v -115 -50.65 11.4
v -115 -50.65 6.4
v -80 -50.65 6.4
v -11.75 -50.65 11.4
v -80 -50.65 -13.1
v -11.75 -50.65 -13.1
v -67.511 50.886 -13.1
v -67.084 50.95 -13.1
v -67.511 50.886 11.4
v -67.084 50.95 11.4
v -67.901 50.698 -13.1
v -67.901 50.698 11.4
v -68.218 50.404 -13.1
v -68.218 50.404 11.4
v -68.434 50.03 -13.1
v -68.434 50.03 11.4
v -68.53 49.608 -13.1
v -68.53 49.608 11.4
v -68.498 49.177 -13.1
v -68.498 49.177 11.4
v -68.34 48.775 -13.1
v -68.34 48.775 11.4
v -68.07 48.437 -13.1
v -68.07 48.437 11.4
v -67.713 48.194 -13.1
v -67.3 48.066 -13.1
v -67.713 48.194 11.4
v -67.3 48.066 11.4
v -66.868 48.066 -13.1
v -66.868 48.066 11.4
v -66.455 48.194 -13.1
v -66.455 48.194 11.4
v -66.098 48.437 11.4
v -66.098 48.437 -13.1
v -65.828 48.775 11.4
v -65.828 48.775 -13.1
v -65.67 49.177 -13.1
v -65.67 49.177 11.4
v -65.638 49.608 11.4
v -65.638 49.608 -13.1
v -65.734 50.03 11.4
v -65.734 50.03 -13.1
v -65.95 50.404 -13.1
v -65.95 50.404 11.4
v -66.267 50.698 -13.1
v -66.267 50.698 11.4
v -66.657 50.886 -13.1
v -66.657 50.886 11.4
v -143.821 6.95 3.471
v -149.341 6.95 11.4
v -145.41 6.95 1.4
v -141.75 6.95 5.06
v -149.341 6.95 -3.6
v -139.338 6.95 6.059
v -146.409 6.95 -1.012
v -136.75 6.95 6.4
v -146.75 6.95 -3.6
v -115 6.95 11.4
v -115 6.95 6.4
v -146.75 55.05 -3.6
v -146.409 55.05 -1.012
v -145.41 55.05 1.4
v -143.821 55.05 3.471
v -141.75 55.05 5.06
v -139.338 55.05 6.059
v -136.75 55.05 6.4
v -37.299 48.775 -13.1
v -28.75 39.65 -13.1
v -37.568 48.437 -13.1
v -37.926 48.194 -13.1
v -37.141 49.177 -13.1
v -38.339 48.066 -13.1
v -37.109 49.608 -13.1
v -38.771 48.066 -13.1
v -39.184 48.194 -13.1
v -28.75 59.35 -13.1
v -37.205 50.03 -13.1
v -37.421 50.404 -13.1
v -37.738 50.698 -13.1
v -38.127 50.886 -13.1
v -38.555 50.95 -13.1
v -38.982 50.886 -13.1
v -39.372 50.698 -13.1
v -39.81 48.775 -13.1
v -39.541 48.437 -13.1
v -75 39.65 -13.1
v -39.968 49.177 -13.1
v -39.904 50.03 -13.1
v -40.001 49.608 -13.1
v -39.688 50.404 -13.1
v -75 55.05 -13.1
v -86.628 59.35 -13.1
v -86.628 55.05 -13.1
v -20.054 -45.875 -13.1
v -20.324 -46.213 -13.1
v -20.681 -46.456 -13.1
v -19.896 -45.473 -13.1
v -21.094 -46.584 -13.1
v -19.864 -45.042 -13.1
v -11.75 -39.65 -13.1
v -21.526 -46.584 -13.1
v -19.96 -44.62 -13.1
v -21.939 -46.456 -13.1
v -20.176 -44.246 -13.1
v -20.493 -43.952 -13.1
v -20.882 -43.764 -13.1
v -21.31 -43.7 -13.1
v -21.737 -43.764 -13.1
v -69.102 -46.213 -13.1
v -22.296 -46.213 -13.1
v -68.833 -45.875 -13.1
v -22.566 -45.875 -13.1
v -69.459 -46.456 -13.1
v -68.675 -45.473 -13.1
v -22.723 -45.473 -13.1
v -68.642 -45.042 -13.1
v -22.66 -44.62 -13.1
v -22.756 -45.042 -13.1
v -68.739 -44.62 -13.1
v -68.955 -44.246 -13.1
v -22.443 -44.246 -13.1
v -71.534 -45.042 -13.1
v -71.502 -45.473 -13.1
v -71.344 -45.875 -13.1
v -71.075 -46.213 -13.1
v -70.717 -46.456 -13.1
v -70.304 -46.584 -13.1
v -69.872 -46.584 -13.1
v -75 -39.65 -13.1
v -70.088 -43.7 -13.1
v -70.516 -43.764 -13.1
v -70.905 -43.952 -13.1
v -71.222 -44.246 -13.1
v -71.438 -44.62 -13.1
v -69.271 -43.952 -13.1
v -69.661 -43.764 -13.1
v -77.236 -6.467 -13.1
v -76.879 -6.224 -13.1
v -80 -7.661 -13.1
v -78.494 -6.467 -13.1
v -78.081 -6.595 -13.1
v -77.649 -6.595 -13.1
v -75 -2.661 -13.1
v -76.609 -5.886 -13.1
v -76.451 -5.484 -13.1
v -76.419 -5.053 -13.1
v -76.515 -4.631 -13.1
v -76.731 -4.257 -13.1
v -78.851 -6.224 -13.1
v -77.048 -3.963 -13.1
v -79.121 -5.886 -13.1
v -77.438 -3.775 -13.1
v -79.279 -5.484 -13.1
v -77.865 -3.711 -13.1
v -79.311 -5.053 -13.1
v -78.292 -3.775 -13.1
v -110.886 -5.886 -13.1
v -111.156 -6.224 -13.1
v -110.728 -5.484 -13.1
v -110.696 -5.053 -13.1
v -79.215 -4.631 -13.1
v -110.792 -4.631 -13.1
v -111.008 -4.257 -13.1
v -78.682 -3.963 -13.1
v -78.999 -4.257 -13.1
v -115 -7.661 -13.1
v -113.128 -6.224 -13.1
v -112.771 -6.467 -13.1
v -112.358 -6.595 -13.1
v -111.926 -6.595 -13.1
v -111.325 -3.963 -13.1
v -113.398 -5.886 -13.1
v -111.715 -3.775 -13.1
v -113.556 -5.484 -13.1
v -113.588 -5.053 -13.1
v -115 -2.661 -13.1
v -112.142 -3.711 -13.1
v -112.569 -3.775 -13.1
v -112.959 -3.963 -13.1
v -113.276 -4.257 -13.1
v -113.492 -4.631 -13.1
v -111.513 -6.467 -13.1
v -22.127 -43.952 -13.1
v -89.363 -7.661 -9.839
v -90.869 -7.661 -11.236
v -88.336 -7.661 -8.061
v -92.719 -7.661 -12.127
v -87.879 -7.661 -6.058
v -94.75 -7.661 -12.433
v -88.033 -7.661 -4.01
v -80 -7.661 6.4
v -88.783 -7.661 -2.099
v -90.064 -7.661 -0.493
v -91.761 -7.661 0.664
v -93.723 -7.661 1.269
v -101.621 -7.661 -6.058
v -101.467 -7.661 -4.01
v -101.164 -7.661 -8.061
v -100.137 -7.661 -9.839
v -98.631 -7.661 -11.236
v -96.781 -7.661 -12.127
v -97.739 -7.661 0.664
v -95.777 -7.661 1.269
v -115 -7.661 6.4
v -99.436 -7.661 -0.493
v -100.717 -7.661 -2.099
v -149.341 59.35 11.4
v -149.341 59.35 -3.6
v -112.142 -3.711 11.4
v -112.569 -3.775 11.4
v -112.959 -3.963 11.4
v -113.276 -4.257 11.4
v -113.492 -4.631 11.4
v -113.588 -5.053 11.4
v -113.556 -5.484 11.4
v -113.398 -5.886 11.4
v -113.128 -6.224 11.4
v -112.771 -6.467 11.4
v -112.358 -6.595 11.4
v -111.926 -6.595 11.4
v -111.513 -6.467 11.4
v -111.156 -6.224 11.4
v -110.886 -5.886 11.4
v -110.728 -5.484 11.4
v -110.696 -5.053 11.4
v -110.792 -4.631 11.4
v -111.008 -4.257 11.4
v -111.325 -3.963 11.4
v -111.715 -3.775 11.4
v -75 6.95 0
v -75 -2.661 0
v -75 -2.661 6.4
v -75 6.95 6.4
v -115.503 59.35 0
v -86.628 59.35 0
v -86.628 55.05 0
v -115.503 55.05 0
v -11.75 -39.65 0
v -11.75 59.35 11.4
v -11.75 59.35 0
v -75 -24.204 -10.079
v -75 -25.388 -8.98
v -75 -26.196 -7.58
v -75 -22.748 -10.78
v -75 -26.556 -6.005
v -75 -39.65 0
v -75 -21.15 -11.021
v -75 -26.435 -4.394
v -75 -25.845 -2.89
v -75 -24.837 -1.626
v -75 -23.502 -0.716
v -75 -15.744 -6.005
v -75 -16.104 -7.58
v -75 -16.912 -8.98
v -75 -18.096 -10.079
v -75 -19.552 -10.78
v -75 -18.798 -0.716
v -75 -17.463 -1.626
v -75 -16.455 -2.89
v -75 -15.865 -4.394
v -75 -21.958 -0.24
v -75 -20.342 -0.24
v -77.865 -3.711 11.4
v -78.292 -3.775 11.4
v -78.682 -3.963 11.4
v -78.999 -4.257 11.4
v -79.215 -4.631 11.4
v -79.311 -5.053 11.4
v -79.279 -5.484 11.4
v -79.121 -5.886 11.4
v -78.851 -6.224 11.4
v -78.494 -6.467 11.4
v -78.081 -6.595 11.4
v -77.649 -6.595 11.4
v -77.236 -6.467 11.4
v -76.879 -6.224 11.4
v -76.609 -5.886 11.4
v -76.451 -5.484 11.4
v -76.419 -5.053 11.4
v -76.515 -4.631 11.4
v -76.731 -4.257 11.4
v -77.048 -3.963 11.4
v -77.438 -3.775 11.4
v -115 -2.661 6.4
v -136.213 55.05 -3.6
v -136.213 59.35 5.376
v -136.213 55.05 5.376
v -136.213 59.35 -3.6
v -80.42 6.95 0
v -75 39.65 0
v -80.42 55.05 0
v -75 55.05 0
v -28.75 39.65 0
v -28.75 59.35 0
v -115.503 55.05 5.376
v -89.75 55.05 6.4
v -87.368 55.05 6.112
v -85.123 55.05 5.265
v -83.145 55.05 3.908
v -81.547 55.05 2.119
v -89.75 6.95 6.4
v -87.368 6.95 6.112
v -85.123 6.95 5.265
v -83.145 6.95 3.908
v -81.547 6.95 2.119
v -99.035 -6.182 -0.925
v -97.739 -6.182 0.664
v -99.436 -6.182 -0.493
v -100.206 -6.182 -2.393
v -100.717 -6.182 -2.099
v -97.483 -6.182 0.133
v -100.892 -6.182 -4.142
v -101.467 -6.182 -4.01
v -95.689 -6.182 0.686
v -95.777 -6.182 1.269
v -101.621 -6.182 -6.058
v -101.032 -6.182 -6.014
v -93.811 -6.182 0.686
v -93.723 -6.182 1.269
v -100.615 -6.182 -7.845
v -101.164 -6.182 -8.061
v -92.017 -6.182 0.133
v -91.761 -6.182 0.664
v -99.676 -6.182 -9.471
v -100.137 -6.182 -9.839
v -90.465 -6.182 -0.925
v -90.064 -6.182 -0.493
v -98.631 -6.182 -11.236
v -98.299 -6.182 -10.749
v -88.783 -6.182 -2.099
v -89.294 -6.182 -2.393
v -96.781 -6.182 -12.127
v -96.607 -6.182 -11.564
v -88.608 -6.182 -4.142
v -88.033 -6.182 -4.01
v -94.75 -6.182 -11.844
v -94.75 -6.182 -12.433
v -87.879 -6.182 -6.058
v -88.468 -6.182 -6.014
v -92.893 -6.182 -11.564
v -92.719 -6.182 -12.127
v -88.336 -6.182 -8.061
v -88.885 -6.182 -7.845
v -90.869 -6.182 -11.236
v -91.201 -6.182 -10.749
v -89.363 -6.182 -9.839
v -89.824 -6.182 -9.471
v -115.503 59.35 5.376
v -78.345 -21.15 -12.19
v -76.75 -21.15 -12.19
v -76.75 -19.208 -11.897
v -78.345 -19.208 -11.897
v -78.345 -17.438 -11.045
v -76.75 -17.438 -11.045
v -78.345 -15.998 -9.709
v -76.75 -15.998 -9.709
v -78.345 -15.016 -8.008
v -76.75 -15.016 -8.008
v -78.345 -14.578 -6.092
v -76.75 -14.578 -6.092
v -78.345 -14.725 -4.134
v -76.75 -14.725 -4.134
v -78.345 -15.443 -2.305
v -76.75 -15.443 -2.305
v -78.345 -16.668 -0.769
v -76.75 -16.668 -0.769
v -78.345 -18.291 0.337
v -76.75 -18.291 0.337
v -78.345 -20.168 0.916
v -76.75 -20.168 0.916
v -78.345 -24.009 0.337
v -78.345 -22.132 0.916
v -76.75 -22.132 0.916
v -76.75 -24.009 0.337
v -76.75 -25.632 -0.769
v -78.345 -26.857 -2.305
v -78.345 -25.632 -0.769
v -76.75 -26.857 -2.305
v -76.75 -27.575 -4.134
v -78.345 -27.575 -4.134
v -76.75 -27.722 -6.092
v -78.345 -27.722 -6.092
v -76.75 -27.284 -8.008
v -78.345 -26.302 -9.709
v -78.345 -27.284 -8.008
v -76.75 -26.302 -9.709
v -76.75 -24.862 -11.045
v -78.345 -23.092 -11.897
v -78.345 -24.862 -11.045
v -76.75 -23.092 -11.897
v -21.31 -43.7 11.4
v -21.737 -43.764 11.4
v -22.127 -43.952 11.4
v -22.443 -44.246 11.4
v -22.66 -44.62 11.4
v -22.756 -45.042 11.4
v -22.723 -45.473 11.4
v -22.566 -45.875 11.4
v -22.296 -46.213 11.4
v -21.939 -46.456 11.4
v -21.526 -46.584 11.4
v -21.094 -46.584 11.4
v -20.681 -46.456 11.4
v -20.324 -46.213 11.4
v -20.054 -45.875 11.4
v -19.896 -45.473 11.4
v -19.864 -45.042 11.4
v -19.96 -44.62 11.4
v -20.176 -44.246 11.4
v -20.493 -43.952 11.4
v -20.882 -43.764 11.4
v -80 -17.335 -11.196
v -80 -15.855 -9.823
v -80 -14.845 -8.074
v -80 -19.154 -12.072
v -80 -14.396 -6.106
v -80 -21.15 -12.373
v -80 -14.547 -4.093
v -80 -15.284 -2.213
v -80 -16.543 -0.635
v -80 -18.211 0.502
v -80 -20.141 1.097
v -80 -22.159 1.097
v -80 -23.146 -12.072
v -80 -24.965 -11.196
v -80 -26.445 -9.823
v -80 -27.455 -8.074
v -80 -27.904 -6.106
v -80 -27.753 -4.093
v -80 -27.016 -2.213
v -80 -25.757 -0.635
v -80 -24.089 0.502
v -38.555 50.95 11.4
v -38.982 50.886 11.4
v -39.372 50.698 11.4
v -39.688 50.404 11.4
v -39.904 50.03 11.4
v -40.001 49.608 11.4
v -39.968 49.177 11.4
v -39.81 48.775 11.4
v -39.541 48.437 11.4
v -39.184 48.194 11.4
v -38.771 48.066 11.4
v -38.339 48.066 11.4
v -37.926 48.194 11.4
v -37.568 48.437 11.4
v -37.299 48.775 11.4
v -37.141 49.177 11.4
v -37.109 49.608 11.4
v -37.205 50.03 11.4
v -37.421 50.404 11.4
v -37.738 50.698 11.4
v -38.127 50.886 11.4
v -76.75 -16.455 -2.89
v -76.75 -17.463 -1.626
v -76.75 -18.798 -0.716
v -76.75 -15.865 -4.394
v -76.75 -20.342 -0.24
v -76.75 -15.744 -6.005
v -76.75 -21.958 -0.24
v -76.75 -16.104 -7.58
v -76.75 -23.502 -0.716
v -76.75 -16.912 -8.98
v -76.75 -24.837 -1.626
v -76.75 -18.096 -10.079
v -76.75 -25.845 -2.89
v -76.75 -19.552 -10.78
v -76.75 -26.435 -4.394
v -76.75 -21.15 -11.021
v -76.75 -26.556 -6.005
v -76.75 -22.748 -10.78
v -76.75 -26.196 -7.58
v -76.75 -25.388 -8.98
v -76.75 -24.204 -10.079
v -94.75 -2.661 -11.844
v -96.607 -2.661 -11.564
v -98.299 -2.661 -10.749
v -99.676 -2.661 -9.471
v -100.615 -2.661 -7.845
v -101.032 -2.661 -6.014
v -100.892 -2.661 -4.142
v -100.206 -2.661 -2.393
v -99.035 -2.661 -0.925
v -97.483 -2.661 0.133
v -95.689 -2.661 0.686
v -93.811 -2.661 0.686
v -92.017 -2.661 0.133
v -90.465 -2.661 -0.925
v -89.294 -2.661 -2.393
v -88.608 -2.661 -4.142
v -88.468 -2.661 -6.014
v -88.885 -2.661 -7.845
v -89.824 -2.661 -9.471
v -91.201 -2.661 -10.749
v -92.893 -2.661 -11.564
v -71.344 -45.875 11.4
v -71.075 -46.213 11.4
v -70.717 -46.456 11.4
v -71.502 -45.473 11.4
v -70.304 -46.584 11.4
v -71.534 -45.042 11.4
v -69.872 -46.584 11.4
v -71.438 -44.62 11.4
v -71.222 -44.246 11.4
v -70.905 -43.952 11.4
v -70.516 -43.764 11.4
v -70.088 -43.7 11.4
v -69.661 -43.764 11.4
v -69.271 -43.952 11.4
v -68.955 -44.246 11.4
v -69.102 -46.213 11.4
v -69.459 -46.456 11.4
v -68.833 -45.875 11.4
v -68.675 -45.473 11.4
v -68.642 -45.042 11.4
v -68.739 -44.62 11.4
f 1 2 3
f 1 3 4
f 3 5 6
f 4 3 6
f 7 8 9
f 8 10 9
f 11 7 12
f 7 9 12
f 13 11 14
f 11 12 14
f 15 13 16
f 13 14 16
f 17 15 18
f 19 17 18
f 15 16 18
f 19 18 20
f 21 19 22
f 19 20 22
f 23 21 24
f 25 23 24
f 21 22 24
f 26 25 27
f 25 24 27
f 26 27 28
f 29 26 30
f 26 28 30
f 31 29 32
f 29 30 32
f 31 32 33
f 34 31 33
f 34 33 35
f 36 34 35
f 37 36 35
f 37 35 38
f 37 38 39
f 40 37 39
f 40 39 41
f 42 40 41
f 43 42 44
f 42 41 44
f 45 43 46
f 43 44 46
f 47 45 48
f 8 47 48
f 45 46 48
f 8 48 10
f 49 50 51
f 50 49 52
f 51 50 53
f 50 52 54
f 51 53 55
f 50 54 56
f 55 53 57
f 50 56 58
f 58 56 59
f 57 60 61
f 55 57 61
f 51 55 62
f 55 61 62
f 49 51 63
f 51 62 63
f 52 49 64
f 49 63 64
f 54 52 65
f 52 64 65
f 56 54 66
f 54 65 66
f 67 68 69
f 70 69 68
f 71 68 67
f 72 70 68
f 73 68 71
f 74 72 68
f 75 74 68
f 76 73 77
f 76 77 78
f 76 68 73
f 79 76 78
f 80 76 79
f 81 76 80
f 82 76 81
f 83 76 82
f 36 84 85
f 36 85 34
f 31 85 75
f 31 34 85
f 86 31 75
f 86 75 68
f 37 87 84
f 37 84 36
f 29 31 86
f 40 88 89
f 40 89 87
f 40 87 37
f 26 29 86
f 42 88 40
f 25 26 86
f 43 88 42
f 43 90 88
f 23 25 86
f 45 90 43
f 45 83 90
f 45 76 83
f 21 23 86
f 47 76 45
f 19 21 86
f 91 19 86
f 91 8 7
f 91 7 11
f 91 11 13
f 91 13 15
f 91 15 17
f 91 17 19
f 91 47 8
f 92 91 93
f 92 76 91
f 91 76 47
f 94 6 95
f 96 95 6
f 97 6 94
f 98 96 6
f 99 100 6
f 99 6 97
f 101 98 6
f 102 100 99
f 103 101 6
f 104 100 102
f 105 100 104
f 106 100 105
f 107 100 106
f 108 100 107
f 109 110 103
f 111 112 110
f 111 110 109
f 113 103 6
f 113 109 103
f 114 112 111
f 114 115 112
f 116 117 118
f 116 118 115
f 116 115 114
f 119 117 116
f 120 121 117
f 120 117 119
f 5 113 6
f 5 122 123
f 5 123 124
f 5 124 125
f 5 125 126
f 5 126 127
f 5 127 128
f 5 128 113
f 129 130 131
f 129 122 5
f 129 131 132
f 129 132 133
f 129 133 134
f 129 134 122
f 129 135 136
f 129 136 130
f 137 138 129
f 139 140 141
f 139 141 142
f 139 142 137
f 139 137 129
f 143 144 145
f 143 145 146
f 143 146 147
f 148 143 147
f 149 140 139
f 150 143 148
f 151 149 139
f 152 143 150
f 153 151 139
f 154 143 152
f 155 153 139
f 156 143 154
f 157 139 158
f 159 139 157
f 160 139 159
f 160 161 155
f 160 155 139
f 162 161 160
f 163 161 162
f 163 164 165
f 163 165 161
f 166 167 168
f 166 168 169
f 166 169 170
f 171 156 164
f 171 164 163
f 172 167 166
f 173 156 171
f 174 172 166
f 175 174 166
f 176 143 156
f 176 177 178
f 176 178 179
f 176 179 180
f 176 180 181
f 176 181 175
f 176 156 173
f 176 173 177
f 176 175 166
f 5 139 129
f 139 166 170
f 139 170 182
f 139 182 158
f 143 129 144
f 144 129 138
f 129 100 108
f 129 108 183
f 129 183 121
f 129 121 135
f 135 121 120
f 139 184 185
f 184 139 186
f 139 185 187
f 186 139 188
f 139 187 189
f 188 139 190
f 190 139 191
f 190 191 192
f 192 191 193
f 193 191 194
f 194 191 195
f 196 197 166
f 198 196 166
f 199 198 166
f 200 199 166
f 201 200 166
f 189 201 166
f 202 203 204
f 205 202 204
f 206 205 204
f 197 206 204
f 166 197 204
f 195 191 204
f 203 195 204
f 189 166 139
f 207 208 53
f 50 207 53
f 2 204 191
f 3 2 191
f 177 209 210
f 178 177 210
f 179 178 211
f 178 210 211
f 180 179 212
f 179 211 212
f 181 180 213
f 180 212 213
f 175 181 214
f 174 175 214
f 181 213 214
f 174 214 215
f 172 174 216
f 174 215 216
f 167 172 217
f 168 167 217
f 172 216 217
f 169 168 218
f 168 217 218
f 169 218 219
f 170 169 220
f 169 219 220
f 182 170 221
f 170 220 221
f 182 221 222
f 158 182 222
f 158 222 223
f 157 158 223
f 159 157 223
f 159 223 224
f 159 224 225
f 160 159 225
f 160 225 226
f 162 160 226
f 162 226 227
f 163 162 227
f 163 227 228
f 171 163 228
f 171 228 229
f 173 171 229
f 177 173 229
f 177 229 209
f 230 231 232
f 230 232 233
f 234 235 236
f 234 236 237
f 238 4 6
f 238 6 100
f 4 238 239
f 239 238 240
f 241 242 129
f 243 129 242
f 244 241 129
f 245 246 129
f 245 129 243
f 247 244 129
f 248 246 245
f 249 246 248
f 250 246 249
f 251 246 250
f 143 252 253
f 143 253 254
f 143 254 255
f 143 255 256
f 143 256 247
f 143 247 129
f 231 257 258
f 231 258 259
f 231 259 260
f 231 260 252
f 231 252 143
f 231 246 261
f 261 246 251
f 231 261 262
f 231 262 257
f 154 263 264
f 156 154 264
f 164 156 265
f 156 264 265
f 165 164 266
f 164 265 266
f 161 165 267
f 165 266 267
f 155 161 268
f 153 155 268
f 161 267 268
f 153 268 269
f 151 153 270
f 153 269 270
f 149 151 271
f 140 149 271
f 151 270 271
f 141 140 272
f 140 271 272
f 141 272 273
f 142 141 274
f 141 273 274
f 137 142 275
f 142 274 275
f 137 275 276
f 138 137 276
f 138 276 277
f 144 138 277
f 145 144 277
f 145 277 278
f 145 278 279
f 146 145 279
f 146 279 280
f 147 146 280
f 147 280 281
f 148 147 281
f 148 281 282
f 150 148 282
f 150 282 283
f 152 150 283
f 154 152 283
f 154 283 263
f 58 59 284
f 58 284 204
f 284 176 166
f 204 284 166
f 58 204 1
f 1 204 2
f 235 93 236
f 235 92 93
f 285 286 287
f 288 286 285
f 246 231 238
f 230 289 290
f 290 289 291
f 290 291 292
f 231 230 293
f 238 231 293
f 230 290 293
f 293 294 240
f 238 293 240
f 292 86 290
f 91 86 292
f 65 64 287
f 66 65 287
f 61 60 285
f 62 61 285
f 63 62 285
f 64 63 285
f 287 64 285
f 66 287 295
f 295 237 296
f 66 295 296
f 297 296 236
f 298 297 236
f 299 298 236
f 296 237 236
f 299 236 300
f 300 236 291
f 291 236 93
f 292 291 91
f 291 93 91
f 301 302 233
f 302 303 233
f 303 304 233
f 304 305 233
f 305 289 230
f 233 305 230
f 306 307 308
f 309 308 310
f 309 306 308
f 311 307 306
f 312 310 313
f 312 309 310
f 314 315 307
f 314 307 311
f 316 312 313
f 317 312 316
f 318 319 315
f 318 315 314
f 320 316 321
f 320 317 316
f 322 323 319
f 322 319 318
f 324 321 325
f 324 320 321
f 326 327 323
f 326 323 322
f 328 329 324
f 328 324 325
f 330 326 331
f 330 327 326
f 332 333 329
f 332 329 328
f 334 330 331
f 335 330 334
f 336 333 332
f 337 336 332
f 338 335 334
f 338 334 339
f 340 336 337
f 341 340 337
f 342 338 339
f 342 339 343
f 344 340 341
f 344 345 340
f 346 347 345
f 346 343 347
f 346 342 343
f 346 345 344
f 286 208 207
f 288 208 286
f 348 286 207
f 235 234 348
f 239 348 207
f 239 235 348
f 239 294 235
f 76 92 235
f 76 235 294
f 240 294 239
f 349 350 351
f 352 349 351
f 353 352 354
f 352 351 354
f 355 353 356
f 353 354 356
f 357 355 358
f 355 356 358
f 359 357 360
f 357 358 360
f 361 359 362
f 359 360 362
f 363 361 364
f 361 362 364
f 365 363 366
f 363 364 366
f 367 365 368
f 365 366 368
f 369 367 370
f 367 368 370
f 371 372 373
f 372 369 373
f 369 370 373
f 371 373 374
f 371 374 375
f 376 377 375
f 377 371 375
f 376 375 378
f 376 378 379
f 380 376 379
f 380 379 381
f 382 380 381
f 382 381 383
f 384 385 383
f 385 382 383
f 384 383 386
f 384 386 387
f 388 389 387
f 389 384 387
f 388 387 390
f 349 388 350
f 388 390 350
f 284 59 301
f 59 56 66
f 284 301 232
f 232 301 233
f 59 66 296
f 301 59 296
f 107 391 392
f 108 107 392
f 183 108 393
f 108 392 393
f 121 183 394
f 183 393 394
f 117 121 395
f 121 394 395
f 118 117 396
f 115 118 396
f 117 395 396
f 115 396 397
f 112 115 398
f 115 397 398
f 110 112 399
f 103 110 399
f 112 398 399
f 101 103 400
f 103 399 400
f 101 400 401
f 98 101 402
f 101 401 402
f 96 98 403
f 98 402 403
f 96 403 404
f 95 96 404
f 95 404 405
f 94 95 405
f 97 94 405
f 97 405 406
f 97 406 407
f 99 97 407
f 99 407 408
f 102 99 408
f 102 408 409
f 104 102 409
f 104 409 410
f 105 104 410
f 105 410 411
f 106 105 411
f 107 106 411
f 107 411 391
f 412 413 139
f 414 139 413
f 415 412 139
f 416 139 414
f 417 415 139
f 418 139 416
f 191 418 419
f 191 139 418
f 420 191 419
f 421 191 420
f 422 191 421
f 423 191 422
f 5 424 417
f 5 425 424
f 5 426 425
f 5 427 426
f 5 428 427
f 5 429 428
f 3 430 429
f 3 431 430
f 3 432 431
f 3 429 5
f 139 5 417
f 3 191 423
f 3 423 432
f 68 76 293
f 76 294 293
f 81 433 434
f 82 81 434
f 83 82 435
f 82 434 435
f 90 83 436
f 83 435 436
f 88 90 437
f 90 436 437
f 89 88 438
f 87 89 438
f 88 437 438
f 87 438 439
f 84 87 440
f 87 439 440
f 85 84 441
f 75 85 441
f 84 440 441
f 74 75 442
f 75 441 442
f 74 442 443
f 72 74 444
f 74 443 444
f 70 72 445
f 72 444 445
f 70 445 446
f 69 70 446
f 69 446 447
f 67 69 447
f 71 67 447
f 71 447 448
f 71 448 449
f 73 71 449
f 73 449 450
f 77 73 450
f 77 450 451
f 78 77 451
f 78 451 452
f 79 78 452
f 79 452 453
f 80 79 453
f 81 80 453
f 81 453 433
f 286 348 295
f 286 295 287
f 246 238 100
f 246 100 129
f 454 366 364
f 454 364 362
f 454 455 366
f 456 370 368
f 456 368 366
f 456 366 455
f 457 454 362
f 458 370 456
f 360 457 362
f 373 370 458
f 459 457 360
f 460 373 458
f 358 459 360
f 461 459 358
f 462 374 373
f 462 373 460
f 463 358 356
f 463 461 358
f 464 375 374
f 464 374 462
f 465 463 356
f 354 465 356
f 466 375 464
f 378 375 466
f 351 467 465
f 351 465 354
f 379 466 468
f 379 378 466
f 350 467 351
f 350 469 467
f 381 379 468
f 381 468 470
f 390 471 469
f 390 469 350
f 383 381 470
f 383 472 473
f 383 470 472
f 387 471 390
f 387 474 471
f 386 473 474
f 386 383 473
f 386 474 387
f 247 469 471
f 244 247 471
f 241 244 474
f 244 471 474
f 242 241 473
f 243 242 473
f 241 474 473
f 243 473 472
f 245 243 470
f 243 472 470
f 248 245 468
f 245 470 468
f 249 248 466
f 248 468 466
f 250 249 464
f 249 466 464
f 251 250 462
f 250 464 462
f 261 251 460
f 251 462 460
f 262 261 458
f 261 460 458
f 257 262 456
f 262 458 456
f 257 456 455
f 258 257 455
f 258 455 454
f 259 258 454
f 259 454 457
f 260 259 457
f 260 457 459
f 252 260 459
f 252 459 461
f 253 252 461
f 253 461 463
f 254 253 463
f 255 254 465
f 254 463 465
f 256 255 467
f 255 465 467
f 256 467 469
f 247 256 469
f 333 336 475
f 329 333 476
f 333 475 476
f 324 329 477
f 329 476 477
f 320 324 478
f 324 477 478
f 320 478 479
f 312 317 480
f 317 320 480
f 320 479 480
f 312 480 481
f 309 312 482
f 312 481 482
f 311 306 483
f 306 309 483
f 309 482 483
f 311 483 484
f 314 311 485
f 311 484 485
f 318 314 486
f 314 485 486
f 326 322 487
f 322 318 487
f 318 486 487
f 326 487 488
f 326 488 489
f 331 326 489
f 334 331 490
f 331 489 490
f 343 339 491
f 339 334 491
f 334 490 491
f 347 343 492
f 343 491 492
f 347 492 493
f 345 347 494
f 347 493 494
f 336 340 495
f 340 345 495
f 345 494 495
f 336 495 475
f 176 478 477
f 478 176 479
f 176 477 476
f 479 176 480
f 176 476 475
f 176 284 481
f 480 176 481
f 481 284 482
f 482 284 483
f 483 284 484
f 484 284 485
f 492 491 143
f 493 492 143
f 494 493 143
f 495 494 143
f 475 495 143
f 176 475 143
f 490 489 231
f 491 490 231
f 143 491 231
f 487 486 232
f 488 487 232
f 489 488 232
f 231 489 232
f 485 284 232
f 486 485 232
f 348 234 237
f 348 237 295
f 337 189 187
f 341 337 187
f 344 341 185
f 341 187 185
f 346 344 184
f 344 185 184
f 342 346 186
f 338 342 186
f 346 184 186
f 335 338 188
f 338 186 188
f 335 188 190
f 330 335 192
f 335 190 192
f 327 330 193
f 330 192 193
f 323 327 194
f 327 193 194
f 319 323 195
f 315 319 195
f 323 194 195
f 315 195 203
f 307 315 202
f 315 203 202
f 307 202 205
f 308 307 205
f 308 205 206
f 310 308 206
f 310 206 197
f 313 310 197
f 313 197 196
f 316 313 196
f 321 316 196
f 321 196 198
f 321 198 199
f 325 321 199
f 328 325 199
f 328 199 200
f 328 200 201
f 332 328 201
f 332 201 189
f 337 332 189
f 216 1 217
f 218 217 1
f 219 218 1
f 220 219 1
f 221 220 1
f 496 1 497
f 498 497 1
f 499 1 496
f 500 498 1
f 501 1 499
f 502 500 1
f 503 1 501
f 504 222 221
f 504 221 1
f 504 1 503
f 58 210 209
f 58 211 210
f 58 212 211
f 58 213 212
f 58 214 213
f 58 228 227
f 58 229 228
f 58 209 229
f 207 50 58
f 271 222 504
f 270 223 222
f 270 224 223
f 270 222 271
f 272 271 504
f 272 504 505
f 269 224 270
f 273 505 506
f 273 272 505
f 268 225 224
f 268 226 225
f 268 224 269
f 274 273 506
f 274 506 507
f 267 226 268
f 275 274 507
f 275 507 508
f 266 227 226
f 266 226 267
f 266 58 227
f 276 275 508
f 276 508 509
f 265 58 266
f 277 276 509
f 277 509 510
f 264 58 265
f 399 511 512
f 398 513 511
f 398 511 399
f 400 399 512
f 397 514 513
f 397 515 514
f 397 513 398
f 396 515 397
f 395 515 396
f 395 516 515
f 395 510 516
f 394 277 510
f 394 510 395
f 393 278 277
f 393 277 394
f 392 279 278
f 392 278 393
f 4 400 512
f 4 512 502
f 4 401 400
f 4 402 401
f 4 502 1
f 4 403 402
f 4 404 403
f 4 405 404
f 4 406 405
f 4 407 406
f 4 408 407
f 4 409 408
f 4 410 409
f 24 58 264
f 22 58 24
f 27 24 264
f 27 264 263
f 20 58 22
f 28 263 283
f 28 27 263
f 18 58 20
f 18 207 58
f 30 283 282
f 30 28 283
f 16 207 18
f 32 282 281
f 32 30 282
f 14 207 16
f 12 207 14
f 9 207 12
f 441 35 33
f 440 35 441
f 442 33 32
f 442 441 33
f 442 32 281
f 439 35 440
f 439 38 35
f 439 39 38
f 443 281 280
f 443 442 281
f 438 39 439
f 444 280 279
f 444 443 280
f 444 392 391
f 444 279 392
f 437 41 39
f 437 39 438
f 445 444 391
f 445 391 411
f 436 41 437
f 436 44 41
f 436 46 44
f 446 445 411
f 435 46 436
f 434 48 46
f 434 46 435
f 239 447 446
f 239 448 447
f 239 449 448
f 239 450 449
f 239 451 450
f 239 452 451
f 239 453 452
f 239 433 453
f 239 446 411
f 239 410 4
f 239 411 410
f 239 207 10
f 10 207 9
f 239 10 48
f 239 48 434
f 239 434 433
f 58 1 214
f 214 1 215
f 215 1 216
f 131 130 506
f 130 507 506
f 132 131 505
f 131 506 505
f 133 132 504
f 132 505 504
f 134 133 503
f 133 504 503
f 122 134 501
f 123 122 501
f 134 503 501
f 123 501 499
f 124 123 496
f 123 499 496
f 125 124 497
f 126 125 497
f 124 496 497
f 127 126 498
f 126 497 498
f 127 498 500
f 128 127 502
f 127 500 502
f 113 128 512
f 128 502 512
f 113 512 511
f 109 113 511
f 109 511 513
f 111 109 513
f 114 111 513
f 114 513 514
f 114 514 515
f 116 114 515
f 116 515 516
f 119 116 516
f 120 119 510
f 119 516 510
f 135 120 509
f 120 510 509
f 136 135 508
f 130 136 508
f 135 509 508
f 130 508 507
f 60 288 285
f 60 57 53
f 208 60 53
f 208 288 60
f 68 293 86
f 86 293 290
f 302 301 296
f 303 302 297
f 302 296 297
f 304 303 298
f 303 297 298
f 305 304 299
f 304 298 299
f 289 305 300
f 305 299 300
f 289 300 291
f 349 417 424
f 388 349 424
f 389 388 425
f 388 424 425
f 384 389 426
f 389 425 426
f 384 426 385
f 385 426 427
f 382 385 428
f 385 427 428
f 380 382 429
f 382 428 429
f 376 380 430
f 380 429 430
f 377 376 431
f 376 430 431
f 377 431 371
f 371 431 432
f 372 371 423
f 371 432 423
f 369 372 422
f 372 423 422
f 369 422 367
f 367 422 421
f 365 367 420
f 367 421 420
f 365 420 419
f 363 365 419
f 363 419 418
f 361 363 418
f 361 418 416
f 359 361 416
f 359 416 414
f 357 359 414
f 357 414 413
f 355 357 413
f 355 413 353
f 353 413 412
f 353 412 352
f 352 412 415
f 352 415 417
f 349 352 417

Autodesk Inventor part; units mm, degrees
ref_plane "Work Plane1" through (0, 0, 0) normal (0, 0, 1) x (1, 0, 0)
sketch "Sketch1" plane through (0, 0, 0) normal (0, 0, 1) x (1, 0, 0)
  line L0 (73, -36.65) -> (-73, -36.65) construction
  line L1 (73, 36.65) -> (73, -36.65) construction
  line L2 (-73, 36.65) -> (73, 36.65) construction
  line L3 (-73, -36.65) -> (-73, 36.65) construction
  line L4 (-66.8632, 12.8749) -> (-66.8632, 14.232) construction
  line L5 (-66.8632, 14.232) -> (-61.4969, 10.9795) construction
  line L6 (-61.4969, 10.9795) -> (-57.2382, 10.9795) construction
  line L7 (-57.2382, 10.9795) -> (-57.2382, 9.7003) construction
  line L8 (-57.2382, 9.7003) -> (-61.3643, 9.7003) construction
  line L9 (-61.3643, 9.7003) -> (-66.8632, 6.4478) construction
  line L10 (-66.8632, 6.4478) -> (-66.8632, 7.8674) construction
  line L11 (-66.8632, 7.8674) -> (-62.6279, 10.3477) construction
  line L12 (-62.6279, 10.3477) -> (-66.8632, 12.8749) construction
  spline S0 degree 2 poles (-57.9402, -12.888) (-57.519, -13.3482) (-57.0666, -14.5182) (-57.0666, -15.3995) knots 0 0 0 1 2 2 2 construction
  spline S1 degree 2 poles (-57.0666, -15.3995) (-57.0666, -16.4447) (-57.5034, -17.9111) (-57.8154, -18.5585) knots 0 0 0 1 2 2 2 construction
  line L13 (-57.8154, -18.5585) -> (-59.4221, -18.5585) construction
  line L14 (-59.4221, -18.5585) -> (-59.4221, -18.4649) construction
  spline S2 degree 2 poles (-59.4221, -18.4649) (-58.8294, -17.8331) (-58.1742, -16.2341) (-58.1742, -15.4931) knots 0 0 0 1 2 2 2 construction
  spline S3 degree 2 poles (-58.1742, -15.4931) (-58.1742, -14.4324) (-59.0555, -13.3482) (-59.7809, -13.3482) knots 0 0 0 1 2 2 2 construction
  spline S4 degree 2 poles (-59.7809, -13.3482) (-60.3581, -13.3482) (-61.0757, -13.9176) (-61.2551, -14.5338) knots 0 0 0 1 2 2 2 construction
  spline S5 degree 2 poles (-61.2551, -14.5338) (-61.3799, -14.9784) (-61.5515, -15.7193) (-61.6919, -16.2731) knots 0 0 0 1 2 2 2 construction
  spline S6 degree 2 poles (-61.6919, -16.2731) (-61.8245, -16.7723) (-62.2223, -17.5601) (-62.5421, -17.8643) knots 0 0 0 1 2 2 2 construction
  spline S7 degree 2 poles (-62.5421, -17.8643) (-62.8619, -18.1607) (-63.7199, -18.4883) (-64.2814, -18.4883) knots 0 0 0 1 2 2 2 construction
  spline S8 degree 2 poles (-64.2814, -18.4883) (-65.4514, -18.4883) (-67.0348, -16.6631) (-67.0348, -15.2514) knots 0 0 0 1 2 2 2 construction
  spline S9 degree 2 poles (-67.0348, -15.2514) (-67.0348, -14.4402) (-66.715, -13.005) (-66.4108, -12.3888) knots 0 0 0 1 2 2 2 construction
  line L15 (-66.4108, -12.3888) -> (-64.882, -12.3888) construction
  line L16 (-64.882, -12.3888) -> (-64.882, -12.4824) construction
  spline S10 degree 2 poles (-64.882, -12.4824) (-65.3032, -12.9426) (-65.9272, -14.3778) (-65.9272, -15.1656) knots 0 0 0 1 2 2 2 construction
  spline S11 degree 2 poles (-65.9272, -15.1656) (-65.9272, -16.0547) (-65.0926, -17.1545) (-64.414, -17.1545) knots 0 0 0 1 2 2 2 construction
  spline S12 degree 2 poles (-64.414, -17.1545) (-63.8057, -17.1545) (-63.0803, -16.5071) (-62.9165, -15.8987) knots 0 0 0 1 2 2 2 construction
  spline S13 degree 2 poles (-62.9165, -15.8987) (-62.8073, -15.4931) (-62.5265, -14.3154) (-62.4095, -13.9254) knots 0 0 0 1 2 2 2 construction
  spline S14 degree 2 poles (-62.4095, -13.9254) (-62.1053, -12.9348) (-60.8807, -12.0144) (-59.9837, -12.0144) knots 0 0 0 1 2 2 2 construction
  spline S15 degree 2 poles (-59.9837, -12.0144) (-59.4143, -12.0144) (-58.3224, -12.4746) (-57.9402, -12.888) knots 0 0 0 1 2 2 2 construction
  spline S16 degree 2 poles (-67.066, -7.0069) (-67.066, -6.0241) (-66.3796, -4.4486) (-65.7634, -3.9026) knots 0 0 0 1 2 2 2 construction
  spline S17 degree 2 poles (-65.7634, -3.9026) (-65.1238, -3.3566) (-63.2519, -2.7482) (-62.0507, -2.7482) knots 0 0 0 1 2 2 2 construction
  spline S18 degree 2 poles (-62.0507, -2.7482) (-60.8807, -2.7482) (-58.9854, -3.341) (-58.3458, -3.9026) knots 0 0 0 1 2 2 2 construction
  spline S19 degree 2 poles (-58.3458, -3.9026) (-57.675, -4.4954) (-57.0354, -6.0631) (-57.0354, -7.0069) knots 0 0 0 1 2 2 2 construction
  spline S20 degree 2 poles (-57.0354, -7.0069) (-57.0354, -7.9819) (-57.6984, -9.5419) (-58.3458, -10.1113) knots 0 0 0 1 2 2 2 construction
  spline S21 degree 2 poles (-58.3458, -10.1113) (-58.9854, -10.665) (-60.8651, -11.2578) (-62.0507, -11.2578) knots 0 0 0 1 2 2 2 construction
  spline S22 degree 2 poles (-62.0507, -11.2578) (-63.2597, -11.2578) (-65.1004, -10.6572) (-65.7634, -10.1035) knots 0 0 0 1 2 2 2 construction
  spline S23 degree 2 poles (-65.7634, -10.1035) (-66.403, -9.5419) (-67.066, -7.9741) (-67.066, -7.0069) knots 0 0 0 1 2 2 2 construction
  line L17 (-66.8632, 5.543) -> (-57.2382, 5.543) construction
  line L18 (-57.2382, 5.543) -> (-57.2382, 4.1078) construction
  line L19 (-57.2382, 4.1078) -> (-65.5372, -0.1509) construction
  line L20 (-65.5372, -0.1509) -> (-57.2382, -0.1509) construction
  line L21 (-57.2382, -0.1509) -> (-57.2382, -1.3442) construction
  line L22 (-57.2382, -1.3442) -> (-66.8632, -1.3442) construction
  line L23 (-66.8632, -1.3442) -> (-66.8632, 0.4731) construction
  line L24 (-66.8632, 0.4731) -> (-59.2427, 4.3496) construction
  line L25 (-59.2427, 4.3496) -> (-66.8632, 4.3496) construction
  line L26 (-66.8632, 4.3496) -> (-66.8632, 5.543) construction
  line L27 (-75, -25.3081) -> (-75, -38.65) construction
  line L28 (-75, -38.65) -> (75, -38.65) construction
  line L29 (-75, 38.65) -> (-75, -16.9919) construction
  line L30 (75, 38.65) -> (-75, 38.65) construction
  line L31 (-151.75, -50.65) -> (-11.75, -50.65)
  line L32 (-11.75, -50.65) -> (-11.75, 59.35)
  line L33 (-11.75, 59.35) -> (-151.75, 59.35)
  line L34 (-151.75, 59.35) -> (-151.75, -50.65)
  line L35 (-146.75, 47.05) -> (-146.75, 14.683) construction
  line L36 (-11.75, -50.65) -> (-75, -50.65)
  line L37 (-75, -50.65) -> (-75, 59.35)
  line L38 (-75, 59.35) -> (-11.75, 59.35)
  line L39 (-11.75, 59.35) -> (-11.75, -50.65)
  point P0 (0, 0)
  dimension "d0" = 140
  dimension "d1" = 110
  dimension "d2" = 12
  dimension "d3" = 5
ref_plane "Work Plane2" through (-137.8164, 12.7477, 6.4) normal (0, 0, 1) x (1, 0, 0)
extrude "Extrusion1" add sketch "Sketch1" along normal up to surface (6.4 mm away) contours L37 L33 L32 L31
sketch "Sketch2" plane through (0, 0, 0) normal (0, 0, -1) x (-1, 0, 0)
  line L0 (11.75, -50.65) -> (11.75, 59.35) projected
  line L1 (75, -50.65) -> (11.75, -50.65) projected
  line L2 (75, 59.35) -> (75, -50.65) projected
  line L3 (11.75, 59.35) -> (75, 59.35) projected
  line L4 (75, 38.65) -> (-75, 38.65) projected
  line L5 (75, -38.65) -> (-75, -38.65) projected
  line L6 (75, 59.35) -> (75, -50.65) projected
  line L7 (75, 59.35) -> (28.75, 59.35)
  line L8 (28.75, 59.35) -> (28.75, 39.65)
  line L9 (28.75, 39.65) -> (75, 39.65)
  line L10 (75, 39.65) -> (75, 59.35)
  line L11 (75, -50.65) -> (11.75, -50.65) projected
  line L12 (11.75, -50.65) -> (11.75, 59.35) projected
  line L13 (75, -50.65) -> (11.75, -50.65)
  line L14 (11.75, -50.65) -> (11.75, -39.65)
  line L15 (11.75, -39.65) -> (75, -39.65)
  line L16 (75, -39.65) -> (75, -50.65)
  point P0 (0, 0)
  dimension "d6" = 1
  dimension "d7" = 1
  dimension "d8" = 17
ref_plane "Work Plane3" through (-75.3762, -41.3829, -13.1) normal (0, 0, -1) x (0, 1, 0)
extrude "Extrusion2" add sketch "Sketch2" along normal up to surface (13.1 mm away) contours L0 L15 L2 L1 | L3 L2 L9 L8
sketch "Sketch3" plane through (-75, 59.35, 6.4) normal (0, 1, 0) x (1, 0, 0)
  arc A0 (-14.75, 0) -> (-4.75, 10) centre (-14.75, 10) ccw projected
  arc A1 (-71.75, 10) -> (-61.75, 0) centre (-61.75, 10) ccw projected
  line L0 (-71.75, 10) -> (-74.3413, 10)
  line L1 (-74.3413, 10) -> (-74.3413, 0)
  line L2 (-74.3413, 0) -> (-61.75, 0)
  line L3 (-14.75, 0) -> (0, 0)
  line L4 (0, 0) -> (0, 6.4)
  line L5 (0, 19.5) -> (0, 0) projected
  line L6 (-5.4205, 6.4) -> (0, 6.4)
  point P0 (75, 6.4)
ref_plane "Work Plane4" through (-135.51, 6.95, -15.2395) normal (0, -1, 0) x (1, 0, 0)
extrude "Extrusion3" add sketch "Sketch3" against normal up to surface (52.4 mm away)
sketch "Sketch4" plane through (-75, -50.65, 6.4) normal (0, 0, 1) x (1, 0, 0)
  line L0 (-74.3413, 57.6) -> (-61.75, 57.6) projected
  line L1 (-61.75, 110) -> (-61.75, 57.6) projected
  line L2 (-61.75, 110) -> (-74.3413, 110) projected
  line L3 (-74.3413, 110) -> (-74.3413, 57.6) projected
  line L4 (63.25, 0) -> (0, 0) projected
  line L5 (63.25, 110) -> (63.25, 0) projected
  line L6 (63.25, 110) -> (-14.75, 110) projected
  line L7 (-14.75, 110) -> (-14.75, 57.6) projected
  line L8 (-14.75, 57.6) -> (0, 57.6) projected
  line L9 (0, 0) -> (0, 57.6) projected
  line L10 (-61.75, 110) -> (-61.75, 57.6) projected
  line L11 (-14.75, 57.6) -> (0, 57.6) projected
  line L12 (-61.75, 110) -> (-14.75, 110)
  line L13 (-14.75, 110) -> (-14.75, 57.6)
  line L14 (-14.75, 57.6) -> (-61.75, 57.6)
  line L15 (-61.75, 57.6) -> (-61.75, 110)
  line L16 (0, 57.6) -> (-40, 57.6)
  line L17 (-40, 57.6) -> (-40, 0)
  line L18 (-40, 0) -> (0, 0)
  line L19 (0, 0) -> (0, 57.6)
  point P0 (75, 50.65)
  dimension "d13" = 40
extrude "Extrusion4" add sketch "Sketch4" along normal blind 5
ref_plane "Work Plane5" through (-139.1935, 55.05, -12.427) normal (0, 1, 0) x (0, 0, 1)
sketch "Sketch5" plane through (-28.75, 59.35, 0) normal (0, 1, 0) x (1, 0, 0)
  line L0 (-61, -6.4) -> (-46.25, -6.4) projected
  line L1 (17, 0) -> (17, -11.4) projected
  line L2 (17, 0) -> (0, 0) projected
  line L3 (0, 0) -> (0, 13.1) projected
  line L4 (0, 13.1) -> (-46.25, 13.1) projected
  line L5 (-46.25, 13.1) -> (-46.25, 0) projected
  line L6 (-51.6705, 0) -> (-46.25, 0) projected
  arc A0 (-61, -6.4) -> (-51.6705, 0) centre (-61, 3.6) ccw projected
  line L7 (-61, -6.4) -> (-108, -6.4) projected
  arc A1 (-118, 3.6) -> (-108, -6.4) centre (-108, 3.6) ccw projected
  line L8 (-120.5913, 3.6) -> (-118, 3.6) projected
  line L9 (-120.5913, 3.6) -> (-120.5913, -11.4) projected
  line L10 (17, -11.4) -> (-120.5913, -11.4) projected
  line L11 (-46.25, 13.1) -> (-57.8775, 13.1)
  line L12 (-57.8775, 13.1) -> (-57.8775, 0)
  line L13 (-57.8775, 0) -> (-86.7528, 0)
  line L14 (-86.7528, 0) -> (-86.7528, -5.376)
  line L15 (-86.7528, -5.376) -> (-107.463, -5.376)
  line L16 (-107.463, -5.376) -> (-107.463, 3.6)
  line L17 (-107.463, 3.6) -> (-118, 3.6)
  point P0 (28.75, 0)
extrude "Extrusion5" add sketch "Sketch5" against normal up to surface (4.3 mm away) contours L5 L6 A0 L7 A1 L17 L16 L15 L14 L13 L12 L11
sketch "Sketch6" plane through (-75, -50.65, 6.4) normal (0, 0, -1) x (-1, 0, 0)
  line L0 (61.75, 105.7) -> (14.75, 105.7) projected
  line L1 (14.75, 105.7) -> (14.75, 57.6) projected
  line L2 (14.75, 57.6) -> (0, 57.6) projected
  line L3 (0, 0) -> (0, 57.6) projected
  line L4 (40, 0) -> (0, 0) projected
  line L5 (40, 57.6) -> (40, 0) projected
  line L6 (61.75, 57.6) -> (40, 57.6) projected
  line L7 (61.75, 105.7) -> (61.75, 57.6) projected
  line L8 (40, 57.6) -> (40, 0) projected
  line L9 (40, 47.989) -> (0, 47.989)
  line L10 (0, 47.989) -> (0, 42.989)
  line L11 (0, 42.989) -> (40, 42.989)
  line L12 (40, 42.989) -> (40, 47.989)
  line L13 (40, 0) -> (0, 0) projected
  line L14 (0, 42.989) -> (5, 42.989)
  line L15 (5, 42.989) -> (5, 0)
  line L16 (5, 0) -> (0, 0)
  line L17 (0, 0) -> (0, 42.989)
  point P0 (-75, 50.65)
  dimension "d18" = 5
  dimension "d19" = 5
extrude "Extrusion6" add sketch "Sketch6" along normal up to surface (19.5 mm away) contours L5 L11 L3 L9 | L11 L15 L4 L3
ref_plane "Work Plane6" through (-94.75, 13.95, -5.6) normal (1, 0, 0) x (0, -1, 0)
sketch "Sketch7" plane through (-94.75, 13.95, -5.6) normal (1, 0, 0) x (0, -1, 0)
  line L0 (14.7, 6) -> (30.1, 6)
  line L1 (14.7, -6) -> (30.1, -6)
  line L2 (12.1377, -0.0565) -> (37.0671, -0.0565)
  line L3 (14.7, -0.0565) -> (22.7, -0.0565)
  line L4 (22.7, -0.0565) -> (22.7, 6.2435)
  line L5 (22.7, 6.2435) -> (14.7, 6.2435)
  line L6 (14.7, 6.2435) -> (14.7, -0.0565)
  line L7 (21.611, -12) -> (21.611, 7.5) projected
  line L8 (21.611, -0.0565) -> (20.1319, -0.0565)
  line L9 (20.1319, -0.0565) -> (20.1319, 6.8333)
  line L10 (20.1319, 6.8333) -> (21.611, 6.8333)
  line L11 (21.611, 6.8333) -> (21.611, -0.0565)
  point P0 (13.95, -5.6)
  dimension "d22" = 8
  dimension "d23" = 6.3
revolve "Revolution1" cut sketch "Sketch7" angle 360 about axis through (-94.75, 1.8123, -5.5435) along (0, -1, 0)
ref_plane "Work Plane7" through (-61.9, -21.15, -5.6) normal (0, -1, 0) x (1, 0, 0)
sketch "Sketch8" plane through (-61.9, -21.15, -5.6) normal (0, -1, 0) x (1, 0, 0)
  line L0 (-15.1, -6.34) -> (-15.1, 6.34) construction
  line L1 (-16.3, -6.34) -> (-15.1, -6.34) construction
  arc A0 (-18.2, 0) -> (-16.3, -6.34) centre (-3.4124, 0.9769) ccw construction
  arc A1 (-16.3, 6.34) -> (-18.2, 0) centre (-3.4124, -0.9769) ccw construction
  line L2 (-16.3, 6.34) -> (-15.1, 6.34) construction
  line L3 (-18.1, 12) -> (-18.1, -7.5) construction
  line L4 (-13.1, 5.6) -> (-13.1, -7.5) construction
  line L5 (-18.1, -5.7052) -> (-13.1, -5.7052) construction
  line L6 (-13.1, -5.7052) -> (-13.1, 5.6) construction
  line L7 (-13.1, 5.6) -> (-18.1, 5.6) construction
  line L8 (-18.1, 5.6) -> (-18.1, -5.7052) construction
  line L9 (-22.253, 0) -> (-12.4028, 0) construction
  line L10 (-16.4447, -6.59) -> (-14.85, -6.59)
  line L11 (-14.85, -6.59) -> (-14.85, 6.59)
  line L12 (-14.85, 6.59) -> (-16.4447, 6.59)
  arc A2 (-16.4447, 6.59) -> (-18.4505, 0) centre (-3.4124, -0.9769) ccw
  arc A3 (-18.4505, 0) -> (-16.4447, -6.59) centre (-3.4124, 0.9769) ccw
  line L13 (-14.85, -5.7052) -> (-13.1, -5.7052)
  line L14 (-18.5205, 5.6) -> (-13.1, 5.6) projected
  line L15 (-14.85, 5.6) -> (-13.1, 5.6)
  line L16 (-14.85, 0) -> (-13.1, 0)
  line L17 (-13.1, 0) -> (-13.1, -5.4209)
  line L18 (-13.1, -5.4209) -> (-14.85, -5.4209)
  line L19 (-14.85, -5.4209) -> (-14.85, 0)
  line L20 (-14.85, 0) -> (-18.4505, 0)
  line L21 (-16.4447, -6.59) -> (-18.1, -6.7731)
  line L22 (-18.1, -6.7731) -> (-18.1, -2.3957)
  point P0 (61.9, 5.6)
  dimension "d25" = 0.25
revolve "Revolution2" cut sketch "Sketch8" angle 360 about axis through (-76.75, -21.15, -5.6) along (-1, 0, 0) contours A3 L20 L11 L10 | L21 L22 A3 | L11 L16 L17 L18
sketch "Sketch9" plane through (-28.75, 39.65, -13.1) normal (0, 0, -1) x (-1, 0, 0)
  line L0 (0, 19.7) -> (57.8775, 19.7) projected
  line L1 (0, 0) -> (0, 19.7) projected
  line L2 (46.25, 0) -> (0, 0) projected
  line L3 (46.25, 15.4) -> (46.25, 0) projected
  line L4 (57.8775, 15.4) -> (46.25, 15.4) projected
  line L5 (57.8775, 19.7) -> (57.8775, 15.4) projected
  line L6 (51.25, -90.3) -> (-17, -90.3) projected
  line L7 (51.25, -47.311) -> (51.25, -90.3) projected
  line L8 (86.25, -47.311) -> (51.25, -47.311) projected
  line L9 (86.25, -42.311) -> (86.25, -47.311) projected
  line L10 (46.25, -42.311) -> (86.25, -42.311) projected
  line L11 (46.25, -79.3) -> (46.25, -42.311) projected
  line L12 (-17, -79.3) -> (46.25, -79.3) projected
  line L13 (-17, -90.3) -> (-17, -79.3) projected
  circle A0 centre (-7.4402, -84.8) radius 2.7404
  circle A1 centre (41.3383, -84.8) radius 3.0045
  circle A2 centre (38.3339, 9.85) radius 4.1705
  circle A3 centre (9.8047, 9.85) radius 4.6127
  point P0 (-28.75, -39.65)
  point P1 (49.1151, -44.811)
  point P2 (83.392, -44.811)
hole "Hole1" at (-38.5547, 49.5, -13.1) at (-67.0839, 49.5, -13.1) at (-21.3098, -45.15, -13.1) at (-70.0883, -45.15, -13.1) at (-77.8651, -5.161, -13.1) at (-112.142, -5.161, -13.1) direction (0, 0, 1) diameter 2.9 end through all
properties part number "10_Minispim_Base"
